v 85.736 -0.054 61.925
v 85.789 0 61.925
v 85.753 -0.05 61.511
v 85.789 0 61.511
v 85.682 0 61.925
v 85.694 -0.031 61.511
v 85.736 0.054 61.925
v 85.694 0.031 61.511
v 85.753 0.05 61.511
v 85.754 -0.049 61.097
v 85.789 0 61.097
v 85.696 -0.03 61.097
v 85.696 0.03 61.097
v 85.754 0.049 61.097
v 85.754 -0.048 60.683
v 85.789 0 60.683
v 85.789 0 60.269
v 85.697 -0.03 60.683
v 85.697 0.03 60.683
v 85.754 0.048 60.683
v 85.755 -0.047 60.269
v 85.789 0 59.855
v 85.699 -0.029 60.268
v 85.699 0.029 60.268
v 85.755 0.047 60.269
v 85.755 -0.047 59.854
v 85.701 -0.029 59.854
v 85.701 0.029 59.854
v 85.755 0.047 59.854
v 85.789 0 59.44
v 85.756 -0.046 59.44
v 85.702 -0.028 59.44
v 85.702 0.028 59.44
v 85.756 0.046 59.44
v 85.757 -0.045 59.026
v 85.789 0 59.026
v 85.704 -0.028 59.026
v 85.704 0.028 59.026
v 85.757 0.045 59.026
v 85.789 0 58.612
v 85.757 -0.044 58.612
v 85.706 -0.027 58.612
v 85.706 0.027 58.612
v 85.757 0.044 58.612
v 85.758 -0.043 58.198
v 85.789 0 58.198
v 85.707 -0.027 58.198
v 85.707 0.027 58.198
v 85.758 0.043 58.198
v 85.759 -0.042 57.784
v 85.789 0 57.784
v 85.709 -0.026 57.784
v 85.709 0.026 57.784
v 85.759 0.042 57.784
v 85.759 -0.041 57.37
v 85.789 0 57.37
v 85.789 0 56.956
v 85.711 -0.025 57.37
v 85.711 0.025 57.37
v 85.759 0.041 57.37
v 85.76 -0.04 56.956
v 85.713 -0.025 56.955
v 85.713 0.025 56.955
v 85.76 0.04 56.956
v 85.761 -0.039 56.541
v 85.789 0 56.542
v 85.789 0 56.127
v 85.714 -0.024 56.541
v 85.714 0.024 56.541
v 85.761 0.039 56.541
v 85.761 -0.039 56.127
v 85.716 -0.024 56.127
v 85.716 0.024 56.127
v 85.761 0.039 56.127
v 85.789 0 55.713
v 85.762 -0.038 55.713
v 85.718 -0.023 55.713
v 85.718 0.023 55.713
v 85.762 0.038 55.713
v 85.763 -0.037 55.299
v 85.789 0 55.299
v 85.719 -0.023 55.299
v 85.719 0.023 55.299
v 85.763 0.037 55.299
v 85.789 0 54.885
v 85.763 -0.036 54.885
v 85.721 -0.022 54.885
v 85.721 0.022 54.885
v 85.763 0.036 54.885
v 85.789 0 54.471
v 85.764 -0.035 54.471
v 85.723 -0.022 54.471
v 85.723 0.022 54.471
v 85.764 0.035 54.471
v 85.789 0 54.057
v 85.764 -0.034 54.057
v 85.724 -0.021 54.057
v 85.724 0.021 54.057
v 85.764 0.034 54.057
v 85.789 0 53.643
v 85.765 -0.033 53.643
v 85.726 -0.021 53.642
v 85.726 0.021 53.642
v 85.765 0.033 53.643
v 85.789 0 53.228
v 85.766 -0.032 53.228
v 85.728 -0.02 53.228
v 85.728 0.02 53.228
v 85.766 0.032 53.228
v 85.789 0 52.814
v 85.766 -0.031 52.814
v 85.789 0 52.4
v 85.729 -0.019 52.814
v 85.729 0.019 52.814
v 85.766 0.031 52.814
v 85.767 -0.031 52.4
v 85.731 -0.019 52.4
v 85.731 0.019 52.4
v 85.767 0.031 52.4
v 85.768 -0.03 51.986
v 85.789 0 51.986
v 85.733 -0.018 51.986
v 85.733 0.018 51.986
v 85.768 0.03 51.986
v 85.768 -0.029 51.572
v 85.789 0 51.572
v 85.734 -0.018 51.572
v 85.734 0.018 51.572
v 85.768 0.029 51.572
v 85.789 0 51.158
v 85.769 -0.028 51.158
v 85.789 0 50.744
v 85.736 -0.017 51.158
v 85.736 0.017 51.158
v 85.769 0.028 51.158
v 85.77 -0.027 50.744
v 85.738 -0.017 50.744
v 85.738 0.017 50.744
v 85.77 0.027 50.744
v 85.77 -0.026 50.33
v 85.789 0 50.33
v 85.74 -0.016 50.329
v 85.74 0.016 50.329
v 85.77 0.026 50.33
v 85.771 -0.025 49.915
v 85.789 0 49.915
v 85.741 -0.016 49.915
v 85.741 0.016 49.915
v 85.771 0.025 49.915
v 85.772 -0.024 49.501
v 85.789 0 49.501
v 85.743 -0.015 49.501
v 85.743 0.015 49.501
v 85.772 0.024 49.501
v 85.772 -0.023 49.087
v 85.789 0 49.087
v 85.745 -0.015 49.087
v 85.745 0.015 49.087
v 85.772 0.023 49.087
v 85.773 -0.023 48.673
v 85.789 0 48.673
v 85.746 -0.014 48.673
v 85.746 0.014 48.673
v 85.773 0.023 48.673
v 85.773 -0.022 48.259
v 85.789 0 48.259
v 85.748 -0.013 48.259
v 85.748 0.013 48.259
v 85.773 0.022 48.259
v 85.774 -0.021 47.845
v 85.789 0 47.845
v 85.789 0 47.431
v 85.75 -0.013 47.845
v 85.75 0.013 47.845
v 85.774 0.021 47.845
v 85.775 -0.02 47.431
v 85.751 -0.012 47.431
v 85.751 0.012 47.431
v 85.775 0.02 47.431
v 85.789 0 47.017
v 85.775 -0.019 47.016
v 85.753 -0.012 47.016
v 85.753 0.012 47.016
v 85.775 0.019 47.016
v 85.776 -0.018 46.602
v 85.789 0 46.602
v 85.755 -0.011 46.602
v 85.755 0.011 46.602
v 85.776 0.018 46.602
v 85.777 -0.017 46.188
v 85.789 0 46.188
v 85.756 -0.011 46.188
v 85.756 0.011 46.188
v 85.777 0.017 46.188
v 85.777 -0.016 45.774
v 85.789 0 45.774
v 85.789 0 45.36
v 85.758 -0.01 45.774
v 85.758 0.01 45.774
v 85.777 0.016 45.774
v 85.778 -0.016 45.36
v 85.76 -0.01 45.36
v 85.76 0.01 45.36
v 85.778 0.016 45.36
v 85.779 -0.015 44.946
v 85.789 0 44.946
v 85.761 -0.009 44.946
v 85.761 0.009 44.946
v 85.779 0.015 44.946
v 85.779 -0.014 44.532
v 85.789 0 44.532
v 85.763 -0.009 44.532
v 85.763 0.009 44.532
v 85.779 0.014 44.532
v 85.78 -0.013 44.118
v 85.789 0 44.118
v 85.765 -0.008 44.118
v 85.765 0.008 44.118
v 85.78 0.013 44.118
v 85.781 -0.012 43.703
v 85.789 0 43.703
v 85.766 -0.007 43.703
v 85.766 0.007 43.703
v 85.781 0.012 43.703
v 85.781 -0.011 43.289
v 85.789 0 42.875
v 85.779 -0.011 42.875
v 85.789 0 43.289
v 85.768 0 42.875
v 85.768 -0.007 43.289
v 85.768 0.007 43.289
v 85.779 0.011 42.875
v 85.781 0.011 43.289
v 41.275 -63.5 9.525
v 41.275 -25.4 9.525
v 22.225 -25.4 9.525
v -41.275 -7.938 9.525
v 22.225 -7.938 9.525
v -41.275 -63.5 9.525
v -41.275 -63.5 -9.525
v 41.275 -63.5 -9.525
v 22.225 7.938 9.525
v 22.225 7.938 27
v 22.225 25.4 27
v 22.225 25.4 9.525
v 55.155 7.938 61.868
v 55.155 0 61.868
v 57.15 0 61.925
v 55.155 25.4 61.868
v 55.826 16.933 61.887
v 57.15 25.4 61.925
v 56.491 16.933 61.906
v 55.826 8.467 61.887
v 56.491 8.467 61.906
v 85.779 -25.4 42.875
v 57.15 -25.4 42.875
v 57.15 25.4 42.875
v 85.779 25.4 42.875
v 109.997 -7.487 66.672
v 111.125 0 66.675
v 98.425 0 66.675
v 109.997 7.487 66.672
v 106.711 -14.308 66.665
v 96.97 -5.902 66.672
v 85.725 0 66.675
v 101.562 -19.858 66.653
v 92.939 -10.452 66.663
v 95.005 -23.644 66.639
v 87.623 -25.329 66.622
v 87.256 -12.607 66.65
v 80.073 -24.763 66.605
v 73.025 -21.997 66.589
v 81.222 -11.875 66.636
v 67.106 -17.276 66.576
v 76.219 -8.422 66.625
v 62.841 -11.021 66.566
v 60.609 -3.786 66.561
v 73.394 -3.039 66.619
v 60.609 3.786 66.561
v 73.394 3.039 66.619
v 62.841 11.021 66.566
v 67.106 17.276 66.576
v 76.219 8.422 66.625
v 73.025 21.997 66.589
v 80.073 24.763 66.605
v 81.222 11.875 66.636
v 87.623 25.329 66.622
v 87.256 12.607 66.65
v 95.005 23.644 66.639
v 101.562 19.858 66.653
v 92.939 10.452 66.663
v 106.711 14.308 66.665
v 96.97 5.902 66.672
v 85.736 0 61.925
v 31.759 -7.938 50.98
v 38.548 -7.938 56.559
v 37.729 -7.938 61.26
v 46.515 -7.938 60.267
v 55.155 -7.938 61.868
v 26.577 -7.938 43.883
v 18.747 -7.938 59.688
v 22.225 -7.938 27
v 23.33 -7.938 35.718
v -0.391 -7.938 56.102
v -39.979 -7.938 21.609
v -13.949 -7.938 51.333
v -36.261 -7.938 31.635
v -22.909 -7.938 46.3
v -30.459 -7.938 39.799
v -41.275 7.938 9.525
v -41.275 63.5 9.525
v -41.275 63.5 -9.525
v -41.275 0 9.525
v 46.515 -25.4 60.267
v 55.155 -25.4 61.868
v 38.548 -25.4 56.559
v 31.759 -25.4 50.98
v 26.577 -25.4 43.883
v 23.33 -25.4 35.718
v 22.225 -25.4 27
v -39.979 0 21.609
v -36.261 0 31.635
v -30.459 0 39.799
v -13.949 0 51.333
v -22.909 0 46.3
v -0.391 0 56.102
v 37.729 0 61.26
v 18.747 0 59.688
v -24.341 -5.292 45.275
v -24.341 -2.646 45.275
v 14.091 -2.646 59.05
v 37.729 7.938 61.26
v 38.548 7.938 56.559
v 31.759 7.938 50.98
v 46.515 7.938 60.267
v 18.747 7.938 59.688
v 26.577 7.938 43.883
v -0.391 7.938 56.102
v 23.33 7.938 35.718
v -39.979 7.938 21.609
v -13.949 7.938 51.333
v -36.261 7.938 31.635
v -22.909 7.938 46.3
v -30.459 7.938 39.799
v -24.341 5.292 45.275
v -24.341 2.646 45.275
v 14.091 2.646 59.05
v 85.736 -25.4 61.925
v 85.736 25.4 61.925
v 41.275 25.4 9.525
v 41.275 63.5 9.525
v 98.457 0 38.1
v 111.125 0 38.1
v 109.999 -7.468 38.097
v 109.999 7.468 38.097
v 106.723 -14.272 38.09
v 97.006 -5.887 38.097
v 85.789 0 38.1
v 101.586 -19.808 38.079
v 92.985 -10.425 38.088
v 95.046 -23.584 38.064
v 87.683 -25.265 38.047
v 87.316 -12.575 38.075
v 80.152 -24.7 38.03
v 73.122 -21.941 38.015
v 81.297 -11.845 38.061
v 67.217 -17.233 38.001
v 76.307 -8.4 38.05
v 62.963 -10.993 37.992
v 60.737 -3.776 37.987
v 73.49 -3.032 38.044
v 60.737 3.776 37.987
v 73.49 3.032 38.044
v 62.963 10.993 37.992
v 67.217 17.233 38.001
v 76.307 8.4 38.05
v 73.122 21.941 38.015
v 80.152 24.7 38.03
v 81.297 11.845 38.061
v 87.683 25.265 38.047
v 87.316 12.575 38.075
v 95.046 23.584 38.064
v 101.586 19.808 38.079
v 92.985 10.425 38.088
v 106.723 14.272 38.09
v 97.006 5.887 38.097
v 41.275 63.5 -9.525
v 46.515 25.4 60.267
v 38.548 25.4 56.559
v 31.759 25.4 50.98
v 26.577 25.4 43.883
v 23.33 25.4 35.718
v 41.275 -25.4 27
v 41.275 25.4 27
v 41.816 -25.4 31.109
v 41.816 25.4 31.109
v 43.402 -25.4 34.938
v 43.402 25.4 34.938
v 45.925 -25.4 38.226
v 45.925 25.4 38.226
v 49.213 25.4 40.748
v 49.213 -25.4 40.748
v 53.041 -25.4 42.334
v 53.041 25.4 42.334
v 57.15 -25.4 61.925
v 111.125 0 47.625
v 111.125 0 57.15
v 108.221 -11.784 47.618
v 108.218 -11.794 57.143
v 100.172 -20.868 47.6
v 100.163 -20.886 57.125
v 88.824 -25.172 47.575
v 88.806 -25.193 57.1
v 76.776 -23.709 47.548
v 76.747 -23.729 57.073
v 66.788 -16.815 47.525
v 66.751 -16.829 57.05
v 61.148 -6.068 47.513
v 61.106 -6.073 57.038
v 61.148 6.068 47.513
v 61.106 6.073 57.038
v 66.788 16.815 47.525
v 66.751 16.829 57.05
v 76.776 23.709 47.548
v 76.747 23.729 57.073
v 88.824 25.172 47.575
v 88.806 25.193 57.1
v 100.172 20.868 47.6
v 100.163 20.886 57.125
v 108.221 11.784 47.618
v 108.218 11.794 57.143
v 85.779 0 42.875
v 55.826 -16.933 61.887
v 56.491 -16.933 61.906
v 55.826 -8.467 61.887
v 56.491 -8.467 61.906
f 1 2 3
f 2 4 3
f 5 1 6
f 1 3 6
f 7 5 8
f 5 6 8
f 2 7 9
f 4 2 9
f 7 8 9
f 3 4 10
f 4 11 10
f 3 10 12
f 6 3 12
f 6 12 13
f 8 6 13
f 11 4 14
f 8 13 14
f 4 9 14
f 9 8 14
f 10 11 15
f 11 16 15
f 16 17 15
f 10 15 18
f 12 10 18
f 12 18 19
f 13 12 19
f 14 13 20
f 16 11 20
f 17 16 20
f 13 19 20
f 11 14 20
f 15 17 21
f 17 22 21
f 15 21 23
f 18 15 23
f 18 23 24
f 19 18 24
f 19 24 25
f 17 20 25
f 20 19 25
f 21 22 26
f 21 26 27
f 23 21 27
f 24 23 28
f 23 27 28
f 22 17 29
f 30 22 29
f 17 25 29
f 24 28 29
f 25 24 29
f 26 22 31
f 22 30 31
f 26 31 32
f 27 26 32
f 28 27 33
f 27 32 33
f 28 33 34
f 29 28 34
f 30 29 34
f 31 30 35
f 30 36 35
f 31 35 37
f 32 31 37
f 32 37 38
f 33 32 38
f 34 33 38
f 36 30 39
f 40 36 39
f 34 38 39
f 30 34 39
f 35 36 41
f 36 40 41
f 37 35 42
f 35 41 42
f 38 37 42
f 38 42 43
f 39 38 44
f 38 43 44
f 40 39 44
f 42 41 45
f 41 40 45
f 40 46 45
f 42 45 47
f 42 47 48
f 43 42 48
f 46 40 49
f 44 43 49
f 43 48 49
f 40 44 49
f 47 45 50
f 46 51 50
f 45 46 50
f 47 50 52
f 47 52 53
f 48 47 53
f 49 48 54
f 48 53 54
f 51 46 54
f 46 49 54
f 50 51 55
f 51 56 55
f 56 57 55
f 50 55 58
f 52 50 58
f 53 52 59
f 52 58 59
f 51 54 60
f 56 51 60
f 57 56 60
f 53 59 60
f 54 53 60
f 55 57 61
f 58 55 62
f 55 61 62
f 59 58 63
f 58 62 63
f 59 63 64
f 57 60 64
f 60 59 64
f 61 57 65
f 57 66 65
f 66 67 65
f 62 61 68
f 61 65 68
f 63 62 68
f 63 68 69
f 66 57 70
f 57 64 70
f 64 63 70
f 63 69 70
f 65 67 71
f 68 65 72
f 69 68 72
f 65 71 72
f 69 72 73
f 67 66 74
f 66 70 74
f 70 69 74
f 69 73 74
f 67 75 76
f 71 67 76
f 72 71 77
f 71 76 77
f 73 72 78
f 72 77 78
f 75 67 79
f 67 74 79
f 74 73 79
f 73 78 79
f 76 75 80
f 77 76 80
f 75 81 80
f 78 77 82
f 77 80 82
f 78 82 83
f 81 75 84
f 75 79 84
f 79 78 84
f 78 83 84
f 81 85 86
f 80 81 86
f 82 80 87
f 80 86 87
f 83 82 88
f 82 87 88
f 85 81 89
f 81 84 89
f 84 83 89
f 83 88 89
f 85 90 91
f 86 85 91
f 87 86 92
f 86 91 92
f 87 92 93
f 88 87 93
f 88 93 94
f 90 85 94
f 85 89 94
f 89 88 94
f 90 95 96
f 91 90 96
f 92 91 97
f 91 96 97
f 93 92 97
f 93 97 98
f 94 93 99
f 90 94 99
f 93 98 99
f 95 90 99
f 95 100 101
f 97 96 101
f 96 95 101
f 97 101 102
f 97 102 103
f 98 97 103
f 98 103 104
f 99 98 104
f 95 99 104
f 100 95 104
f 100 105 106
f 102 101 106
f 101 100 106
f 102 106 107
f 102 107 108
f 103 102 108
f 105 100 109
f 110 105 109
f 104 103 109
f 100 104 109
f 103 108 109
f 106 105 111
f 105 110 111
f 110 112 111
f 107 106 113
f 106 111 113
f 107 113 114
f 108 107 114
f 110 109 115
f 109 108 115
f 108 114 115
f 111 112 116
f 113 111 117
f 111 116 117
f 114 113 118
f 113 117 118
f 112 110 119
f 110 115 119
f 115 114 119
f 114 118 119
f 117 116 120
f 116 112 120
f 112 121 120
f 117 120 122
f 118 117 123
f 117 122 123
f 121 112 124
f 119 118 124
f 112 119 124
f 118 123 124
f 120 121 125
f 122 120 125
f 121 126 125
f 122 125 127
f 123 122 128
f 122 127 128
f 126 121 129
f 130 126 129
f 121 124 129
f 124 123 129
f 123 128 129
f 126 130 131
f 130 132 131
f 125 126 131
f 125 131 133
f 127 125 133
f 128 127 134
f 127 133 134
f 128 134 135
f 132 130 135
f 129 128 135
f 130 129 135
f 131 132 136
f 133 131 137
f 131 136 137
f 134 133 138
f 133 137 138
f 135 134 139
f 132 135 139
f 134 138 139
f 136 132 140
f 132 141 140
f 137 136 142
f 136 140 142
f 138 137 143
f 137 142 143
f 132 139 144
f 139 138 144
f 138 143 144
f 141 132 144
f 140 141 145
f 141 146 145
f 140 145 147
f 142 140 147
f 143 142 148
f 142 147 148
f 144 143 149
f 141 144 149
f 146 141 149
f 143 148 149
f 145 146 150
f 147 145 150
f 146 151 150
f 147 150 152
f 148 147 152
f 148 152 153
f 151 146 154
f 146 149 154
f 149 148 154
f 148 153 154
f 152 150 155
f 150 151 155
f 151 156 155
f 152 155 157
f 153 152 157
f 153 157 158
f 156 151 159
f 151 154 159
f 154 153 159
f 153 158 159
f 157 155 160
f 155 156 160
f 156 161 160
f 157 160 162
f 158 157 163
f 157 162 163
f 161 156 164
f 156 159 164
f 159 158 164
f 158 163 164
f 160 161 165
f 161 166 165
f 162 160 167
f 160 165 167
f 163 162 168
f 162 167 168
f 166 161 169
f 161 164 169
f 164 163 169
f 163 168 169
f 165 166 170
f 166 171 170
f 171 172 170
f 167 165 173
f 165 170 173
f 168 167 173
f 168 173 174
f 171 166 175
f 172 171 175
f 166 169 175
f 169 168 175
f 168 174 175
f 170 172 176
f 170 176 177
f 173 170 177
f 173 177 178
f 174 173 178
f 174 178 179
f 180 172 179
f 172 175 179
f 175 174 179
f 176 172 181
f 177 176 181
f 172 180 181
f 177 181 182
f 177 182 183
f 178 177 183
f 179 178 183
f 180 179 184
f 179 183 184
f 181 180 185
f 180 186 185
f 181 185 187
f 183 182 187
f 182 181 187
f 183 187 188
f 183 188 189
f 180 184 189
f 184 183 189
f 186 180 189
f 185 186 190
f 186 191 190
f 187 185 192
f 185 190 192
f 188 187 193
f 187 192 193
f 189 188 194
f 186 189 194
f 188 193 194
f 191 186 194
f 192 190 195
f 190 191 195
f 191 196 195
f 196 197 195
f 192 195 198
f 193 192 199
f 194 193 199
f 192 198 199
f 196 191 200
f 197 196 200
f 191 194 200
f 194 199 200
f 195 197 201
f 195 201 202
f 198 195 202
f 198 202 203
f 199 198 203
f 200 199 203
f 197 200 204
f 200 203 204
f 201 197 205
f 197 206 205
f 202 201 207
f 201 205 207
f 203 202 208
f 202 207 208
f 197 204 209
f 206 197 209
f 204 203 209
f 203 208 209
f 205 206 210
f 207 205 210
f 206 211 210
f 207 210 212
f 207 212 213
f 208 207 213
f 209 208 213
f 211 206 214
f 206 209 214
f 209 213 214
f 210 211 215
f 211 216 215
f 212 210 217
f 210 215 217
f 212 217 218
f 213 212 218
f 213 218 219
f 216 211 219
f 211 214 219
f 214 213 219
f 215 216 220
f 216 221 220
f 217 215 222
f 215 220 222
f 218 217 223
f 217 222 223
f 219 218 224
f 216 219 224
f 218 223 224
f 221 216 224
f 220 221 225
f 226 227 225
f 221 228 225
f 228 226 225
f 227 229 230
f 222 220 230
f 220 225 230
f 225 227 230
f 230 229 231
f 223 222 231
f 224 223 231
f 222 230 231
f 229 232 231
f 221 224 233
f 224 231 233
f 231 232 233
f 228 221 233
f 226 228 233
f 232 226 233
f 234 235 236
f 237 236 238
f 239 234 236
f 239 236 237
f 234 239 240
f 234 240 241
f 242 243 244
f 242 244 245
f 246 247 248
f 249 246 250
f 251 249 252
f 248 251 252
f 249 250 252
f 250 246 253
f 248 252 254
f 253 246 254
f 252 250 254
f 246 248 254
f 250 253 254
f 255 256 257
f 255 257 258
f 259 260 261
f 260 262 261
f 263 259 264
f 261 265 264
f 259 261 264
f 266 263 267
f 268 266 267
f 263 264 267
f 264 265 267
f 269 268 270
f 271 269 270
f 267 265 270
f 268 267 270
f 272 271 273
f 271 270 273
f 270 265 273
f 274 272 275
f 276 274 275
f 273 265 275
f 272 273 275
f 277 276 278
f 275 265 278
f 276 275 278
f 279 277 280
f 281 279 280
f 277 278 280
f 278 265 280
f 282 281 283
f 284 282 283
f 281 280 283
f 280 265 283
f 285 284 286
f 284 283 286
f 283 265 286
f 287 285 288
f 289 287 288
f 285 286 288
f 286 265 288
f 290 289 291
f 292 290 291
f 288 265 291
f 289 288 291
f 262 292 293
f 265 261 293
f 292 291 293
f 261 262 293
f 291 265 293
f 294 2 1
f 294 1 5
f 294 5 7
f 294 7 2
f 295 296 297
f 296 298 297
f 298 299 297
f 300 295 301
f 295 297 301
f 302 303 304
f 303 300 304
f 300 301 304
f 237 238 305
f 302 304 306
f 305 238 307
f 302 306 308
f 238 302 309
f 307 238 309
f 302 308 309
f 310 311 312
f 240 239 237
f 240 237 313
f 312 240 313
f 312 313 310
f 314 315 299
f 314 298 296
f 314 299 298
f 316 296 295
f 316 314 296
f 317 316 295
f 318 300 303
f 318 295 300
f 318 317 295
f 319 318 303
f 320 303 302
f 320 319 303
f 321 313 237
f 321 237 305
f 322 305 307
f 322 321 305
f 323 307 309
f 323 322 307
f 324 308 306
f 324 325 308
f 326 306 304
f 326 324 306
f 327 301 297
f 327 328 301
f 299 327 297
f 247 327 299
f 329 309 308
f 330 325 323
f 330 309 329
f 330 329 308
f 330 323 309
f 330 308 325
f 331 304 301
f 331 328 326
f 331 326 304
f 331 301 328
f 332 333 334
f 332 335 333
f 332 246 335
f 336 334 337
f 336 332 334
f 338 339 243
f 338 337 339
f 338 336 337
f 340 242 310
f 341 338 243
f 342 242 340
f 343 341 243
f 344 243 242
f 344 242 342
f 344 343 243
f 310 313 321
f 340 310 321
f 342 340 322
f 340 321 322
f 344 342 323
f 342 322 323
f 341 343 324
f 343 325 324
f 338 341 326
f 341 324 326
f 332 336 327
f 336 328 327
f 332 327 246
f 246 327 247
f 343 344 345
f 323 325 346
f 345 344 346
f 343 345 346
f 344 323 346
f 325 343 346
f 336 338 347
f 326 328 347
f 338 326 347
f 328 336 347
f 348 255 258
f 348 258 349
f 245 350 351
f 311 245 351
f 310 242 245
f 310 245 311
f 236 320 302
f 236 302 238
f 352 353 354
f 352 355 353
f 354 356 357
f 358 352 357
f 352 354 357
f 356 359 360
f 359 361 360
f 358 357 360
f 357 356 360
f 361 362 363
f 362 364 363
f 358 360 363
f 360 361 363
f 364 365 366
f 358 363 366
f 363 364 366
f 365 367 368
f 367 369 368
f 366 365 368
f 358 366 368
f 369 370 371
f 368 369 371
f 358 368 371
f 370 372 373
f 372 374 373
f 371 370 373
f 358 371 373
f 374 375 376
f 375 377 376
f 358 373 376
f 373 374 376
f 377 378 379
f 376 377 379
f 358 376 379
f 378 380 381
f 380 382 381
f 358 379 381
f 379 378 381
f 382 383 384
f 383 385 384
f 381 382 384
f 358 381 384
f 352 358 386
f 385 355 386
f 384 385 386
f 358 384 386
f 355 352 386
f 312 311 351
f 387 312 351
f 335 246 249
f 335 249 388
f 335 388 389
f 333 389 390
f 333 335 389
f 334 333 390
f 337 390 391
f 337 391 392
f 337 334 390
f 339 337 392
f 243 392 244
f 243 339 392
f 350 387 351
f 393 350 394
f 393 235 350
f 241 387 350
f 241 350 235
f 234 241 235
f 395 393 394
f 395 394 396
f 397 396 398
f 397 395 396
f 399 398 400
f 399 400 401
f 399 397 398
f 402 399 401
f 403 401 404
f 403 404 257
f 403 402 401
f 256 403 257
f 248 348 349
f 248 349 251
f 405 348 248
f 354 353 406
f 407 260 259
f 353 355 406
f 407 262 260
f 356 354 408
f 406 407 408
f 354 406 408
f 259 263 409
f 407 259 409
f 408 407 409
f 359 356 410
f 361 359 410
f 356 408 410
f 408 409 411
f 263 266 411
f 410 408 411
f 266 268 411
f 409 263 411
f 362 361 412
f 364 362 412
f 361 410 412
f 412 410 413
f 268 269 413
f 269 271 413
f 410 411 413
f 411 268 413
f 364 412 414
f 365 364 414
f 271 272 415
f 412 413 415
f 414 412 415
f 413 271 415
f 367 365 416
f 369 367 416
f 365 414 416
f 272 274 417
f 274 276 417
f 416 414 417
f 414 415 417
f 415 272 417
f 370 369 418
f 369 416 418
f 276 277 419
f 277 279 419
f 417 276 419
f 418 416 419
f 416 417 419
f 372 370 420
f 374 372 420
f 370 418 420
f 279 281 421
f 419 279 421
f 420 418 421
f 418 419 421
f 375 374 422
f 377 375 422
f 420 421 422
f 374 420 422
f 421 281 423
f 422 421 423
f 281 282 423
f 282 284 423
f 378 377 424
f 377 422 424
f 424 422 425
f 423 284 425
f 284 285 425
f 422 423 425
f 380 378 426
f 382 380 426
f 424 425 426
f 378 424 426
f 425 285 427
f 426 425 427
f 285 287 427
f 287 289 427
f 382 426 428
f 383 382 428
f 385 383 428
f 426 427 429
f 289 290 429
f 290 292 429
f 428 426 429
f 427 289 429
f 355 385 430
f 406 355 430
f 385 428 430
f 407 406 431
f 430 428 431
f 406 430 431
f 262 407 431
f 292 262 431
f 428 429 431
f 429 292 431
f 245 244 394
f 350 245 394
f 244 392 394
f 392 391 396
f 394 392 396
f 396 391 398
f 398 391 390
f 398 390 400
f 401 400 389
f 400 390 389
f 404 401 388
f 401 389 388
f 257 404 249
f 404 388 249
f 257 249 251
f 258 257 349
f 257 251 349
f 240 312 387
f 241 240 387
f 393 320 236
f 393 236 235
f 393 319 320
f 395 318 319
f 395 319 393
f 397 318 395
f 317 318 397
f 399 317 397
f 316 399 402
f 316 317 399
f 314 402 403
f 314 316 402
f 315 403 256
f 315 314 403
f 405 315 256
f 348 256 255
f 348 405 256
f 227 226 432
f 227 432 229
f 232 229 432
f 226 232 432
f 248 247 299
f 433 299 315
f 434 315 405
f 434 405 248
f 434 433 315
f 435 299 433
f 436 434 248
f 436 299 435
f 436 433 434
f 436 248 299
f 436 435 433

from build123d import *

# Parameters (mm, degrees)
F1_DEPTH = 63.5
F2_DEPTH = 25.4
F3_DEPTH = 7.9375


with BuildPart() as f1:
    # F0 (on Front) → F1 (new body, symmetric)
    with BuildSketch(Plane.XZ):
        Polygon((22.225, 9.525), (-41.275, 9.525), (-41.275, -9.525), (41.275, -9.525), (41.275, 9.525), align=None)
    extrude(amount=F1_DEPTH, both=True)

    # F0 (on Front) → F2 (join, symmetric)
    with BuildSketch(Plane.XZ):
        with BuildLine():
            Line((22.225, 27.0002), (22.225, 9.525))
            Line((22.225, 9.525), (41.275, 9.525))
            Line((41.275, 9.525), (41.275, 27.0002))
            ThreePointArc((41.275, 27.0002), (45.9246798487, 38.2255201513), (57.15, 42.8752))
            Line((57.15, 42.8752), (60.325, 42.8752))
            Line((60.325, 42.8752), (60.325, 61.9252))
            Line((60.325, 61.9252), (57.15, 61.9252))
            add(Edge.make_bspline(
                [(55.1550839927, 61.8681786498), (55.8287248992, 61.8870479085), (56.4938809422, 61.905947569), (57.15, 61.9252)],
                knots=[109.4613914809, 109.4613914809, 109.4613914809, 109.4613914809, 111.5045361635, 111.5045361635, 111.5045361635, 111.5045361635], degree=3))
            ThreePointArc((55.1550839927, 61.8681786498), (31.7587803901, 50.9802248483), (22.225, 27.0002))
        make_face()
        Polygon((85.735681167, 61.9252), (60.325, 61.9252), (60.325, 42.8752), (85.725, 42.8752), (85.7785200719, 42.8752), align=None)
    extrude(amount=F2_DEPTH, both=True)

    # F0 (on Front) → F3 (join, symmetric)
    with BuildSketch(Plane.XZ):
        with BuildLine():
            add(Edge.make_bspline(
                [(-41.275, 9.525), (-41.3793846384, 59.9336008286), (19.0648004183, 60.8572588993), (55.1550839927, 61.8681786498)],
                knots=[0, 0, 0, 0, 109.4613914809, 109.4613914809, 109.4613914809, 109.4613914809], degree=3))
            Line((-41.275, 9.525), (22.225, 9.525))
            Line((22.225, 9.525), (22.225, 27.0002))
            ThreePointArc((22.225, 27.0002), (31.7587803901, 50.9802248483), (55.1550839927, 61.8681786498))
        make_face()
    extrude(amount=F3_DEPTH, both=True)


with BuildPart() as f4:
    # F0 (on Front) → F4 (revolve)
    with BuildSketch(Plane.XZ):
        Polygon((85.725, 66.675), (85.735681167, 61.9252), (85.7892583575, 61.9252), (85.7892583575, 42.8752), (85.7785200719, 42.8752), (85.7892583575, 38.1), (111.125, 38.1), (111.125, 66.675), align=None)
    revolve(axis=Axis((85.7571291787, 0, 52.3875), (0.0022487557, 0, -0.9999974715)))


solid = Compound([f1.part, f4.part])
